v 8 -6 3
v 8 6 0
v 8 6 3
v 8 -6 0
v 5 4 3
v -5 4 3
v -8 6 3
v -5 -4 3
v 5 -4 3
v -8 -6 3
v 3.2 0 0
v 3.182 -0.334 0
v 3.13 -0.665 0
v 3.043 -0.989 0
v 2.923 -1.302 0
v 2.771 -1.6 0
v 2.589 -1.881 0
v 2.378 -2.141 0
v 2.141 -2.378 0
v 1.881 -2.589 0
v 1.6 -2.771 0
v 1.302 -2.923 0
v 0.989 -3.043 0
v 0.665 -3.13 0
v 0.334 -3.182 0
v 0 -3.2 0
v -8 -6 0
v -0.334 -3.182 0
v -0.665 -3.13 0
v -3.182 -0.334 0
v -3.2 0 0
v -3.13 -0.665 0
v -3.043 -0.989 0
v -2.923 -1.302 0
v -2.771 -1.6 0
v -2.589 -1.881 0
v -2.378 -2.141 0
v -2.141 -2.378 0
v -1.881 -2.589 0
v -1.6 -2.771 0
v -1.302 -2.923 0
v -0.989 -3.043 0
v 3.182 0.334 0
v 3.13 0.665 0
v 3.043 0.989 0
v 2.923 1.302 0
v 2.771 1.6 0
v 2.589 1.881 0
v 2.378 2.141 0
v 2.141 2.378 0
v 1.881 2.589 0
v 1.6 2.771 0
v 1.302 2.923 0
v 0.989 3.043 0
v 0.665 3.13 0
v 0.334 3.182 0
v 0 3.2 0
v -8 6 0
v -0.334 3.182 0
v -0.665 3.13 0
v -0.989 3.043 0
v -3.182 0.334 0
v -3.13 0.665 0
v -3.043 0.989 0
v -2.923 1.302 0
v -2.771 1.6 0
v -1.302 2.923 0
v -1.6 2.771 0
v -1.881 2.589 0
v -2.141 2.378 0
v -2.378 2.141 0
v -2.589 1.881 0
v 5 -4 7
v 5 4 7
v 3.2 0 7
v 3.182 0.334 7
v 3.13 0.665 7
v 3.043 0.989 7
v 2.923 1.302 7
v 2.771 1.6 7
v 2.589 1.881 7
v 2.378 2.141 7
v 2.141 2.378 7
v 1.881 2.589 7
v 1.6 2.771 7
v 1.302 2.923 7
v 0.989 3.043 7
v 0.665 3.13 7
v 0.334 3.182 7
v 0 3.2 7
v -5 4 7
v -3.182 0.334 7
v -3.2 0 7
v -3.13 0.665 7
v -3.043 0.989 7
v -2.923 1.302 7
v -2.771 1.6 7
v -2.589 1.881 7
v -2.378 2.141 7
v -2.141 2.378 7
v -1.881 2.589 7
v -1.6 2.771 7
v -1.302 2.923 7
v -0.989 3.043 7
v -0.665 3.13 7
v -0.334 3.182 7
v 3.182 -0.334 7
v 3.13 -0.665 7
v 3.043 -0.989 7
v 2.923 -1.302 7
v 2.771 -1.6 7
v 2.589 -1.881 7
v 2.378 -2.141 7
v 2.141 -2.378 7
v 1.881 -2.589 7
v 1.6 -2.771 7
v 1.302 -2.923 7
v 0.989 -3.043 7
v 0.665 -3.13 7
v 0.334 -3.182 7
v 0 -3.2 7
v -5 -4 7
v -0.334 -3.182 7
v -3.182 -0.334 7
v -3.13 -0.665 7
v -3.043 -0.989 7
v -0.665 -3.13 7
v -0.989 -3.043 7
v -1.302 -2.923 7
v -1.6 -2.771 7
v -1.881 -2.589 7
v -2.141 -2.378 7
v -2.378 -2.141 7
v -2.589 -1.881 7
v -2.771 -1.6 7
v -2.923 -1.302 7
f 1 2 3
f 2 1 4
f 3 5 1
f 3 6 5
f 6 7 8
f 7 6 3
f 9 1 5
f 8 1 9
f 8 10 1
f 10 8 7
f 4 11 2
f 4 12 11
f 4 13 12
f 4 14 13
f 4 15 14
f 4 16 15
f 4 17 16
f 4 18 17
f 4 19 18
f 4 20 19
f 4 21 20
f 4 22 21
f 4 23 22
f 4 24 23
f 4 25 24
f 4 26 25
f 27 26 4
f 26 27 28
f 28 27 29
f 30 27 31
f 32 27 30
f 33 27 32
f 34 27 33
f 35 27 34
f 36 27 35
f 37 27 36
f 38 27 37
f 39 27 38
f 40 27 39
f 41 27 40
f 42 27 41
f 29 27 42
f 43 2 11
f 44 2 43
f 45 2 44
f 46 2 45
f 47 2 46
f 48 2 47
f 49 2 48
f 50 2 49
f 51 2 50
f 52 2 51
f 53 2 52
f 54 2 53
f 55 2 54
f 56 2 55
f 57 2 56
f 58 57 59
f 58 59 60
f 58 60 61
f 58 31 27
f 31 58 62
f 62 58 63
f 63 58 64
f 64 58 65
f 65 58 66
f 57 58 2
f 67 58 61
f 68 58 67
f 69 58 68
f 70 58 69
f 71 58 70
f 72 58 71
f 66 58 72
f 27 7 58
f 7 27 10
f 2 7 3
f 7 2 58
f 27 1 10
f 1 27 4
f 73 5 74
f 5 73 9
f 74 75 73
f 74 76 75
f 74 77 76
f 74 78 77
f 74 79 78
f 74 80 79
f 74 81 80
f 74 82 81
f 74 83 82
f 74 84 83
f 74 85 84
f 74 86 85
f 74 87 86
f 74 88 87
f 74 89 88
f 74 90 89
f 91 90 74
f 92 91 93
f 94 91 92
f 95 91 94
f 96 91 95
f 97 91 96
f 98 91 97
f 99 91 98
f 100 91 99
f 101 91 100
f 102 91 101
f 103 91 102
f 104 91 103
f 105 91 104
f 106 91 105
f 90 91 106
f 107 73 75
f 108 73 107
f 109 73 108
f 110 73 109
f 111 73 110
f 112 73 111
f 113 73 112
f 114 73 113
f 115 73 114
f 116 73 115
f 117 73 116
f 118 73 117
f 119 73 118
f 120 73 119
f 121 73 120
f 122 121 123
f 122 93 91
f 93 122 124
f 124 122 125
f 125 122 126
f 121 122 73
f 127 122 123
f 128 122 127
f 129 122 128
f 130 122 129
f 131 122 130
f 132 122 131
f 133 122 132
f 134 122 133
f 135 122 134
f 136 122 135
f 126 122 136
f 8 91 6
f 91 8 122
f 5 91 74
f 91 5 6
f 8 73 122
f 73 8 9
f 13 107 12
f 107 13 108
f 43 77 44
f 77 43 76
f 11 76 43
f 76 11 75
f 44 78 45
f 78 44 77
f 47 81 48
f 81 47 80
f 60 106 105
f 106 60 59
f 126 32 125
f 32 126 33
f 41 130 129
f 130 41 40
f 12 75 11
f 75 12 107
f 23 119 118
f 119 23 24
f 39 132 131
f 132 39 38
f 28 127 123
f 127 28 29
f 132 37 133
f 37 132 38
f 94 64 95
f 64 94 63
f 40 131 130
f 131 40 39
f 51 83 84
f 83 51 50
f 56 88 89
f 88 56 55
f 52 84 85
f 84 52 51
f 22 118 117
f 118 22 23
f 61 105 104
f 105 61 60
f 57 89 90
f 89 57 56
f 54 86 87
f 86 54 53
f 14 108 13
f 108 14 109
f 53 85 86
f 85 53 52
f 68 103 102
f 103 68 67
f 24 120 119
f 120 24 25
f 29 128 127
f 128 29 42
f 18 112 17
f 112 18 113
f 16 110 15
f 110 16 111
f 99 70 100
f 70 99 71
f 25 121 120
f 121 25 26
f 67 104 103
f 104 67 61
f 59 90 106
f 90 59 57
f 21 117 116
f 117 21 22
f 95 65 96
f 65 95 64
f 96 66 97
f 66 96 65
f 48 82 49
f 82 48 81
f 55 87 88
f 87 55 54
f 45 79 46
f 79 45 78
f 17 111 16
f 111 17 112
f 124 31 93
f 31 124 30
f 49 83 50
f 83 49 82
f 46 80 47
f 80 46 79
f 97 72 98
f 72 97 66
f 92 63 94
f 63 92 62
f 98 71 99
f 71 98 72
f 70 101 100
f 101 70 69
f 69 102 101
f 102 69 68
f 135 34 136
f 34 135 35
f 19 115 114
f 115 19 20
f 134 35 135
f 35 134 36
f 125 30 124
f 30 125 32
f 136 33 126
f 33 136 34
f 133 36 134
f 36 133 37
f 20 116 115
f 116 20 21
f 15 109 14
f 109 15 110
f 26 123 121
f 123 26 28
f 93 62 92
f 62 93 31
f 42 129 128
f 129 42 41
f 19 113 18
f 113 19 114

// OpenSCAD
// T-slot nut for aluminium extrusion.
$fn = 60;
eps = 0.02;
slot_w = 8;
thread_d = 6.4;
length = 16;
body_w = slot_w + 4;
body_h = 7;
difference() {
    union() {
        translate([-length / 2, -body_w / 2, 0]) cube([length, body_w, 3]);
        translate([-length / 2 + 3, -slot_w / 2, 3]) cube([length - 6, slot_w, body_h - 3]);
    }
    translate([0, 0, -eps]) cylinder(d = thread_d, h = body_h + 2 * eps);
}
